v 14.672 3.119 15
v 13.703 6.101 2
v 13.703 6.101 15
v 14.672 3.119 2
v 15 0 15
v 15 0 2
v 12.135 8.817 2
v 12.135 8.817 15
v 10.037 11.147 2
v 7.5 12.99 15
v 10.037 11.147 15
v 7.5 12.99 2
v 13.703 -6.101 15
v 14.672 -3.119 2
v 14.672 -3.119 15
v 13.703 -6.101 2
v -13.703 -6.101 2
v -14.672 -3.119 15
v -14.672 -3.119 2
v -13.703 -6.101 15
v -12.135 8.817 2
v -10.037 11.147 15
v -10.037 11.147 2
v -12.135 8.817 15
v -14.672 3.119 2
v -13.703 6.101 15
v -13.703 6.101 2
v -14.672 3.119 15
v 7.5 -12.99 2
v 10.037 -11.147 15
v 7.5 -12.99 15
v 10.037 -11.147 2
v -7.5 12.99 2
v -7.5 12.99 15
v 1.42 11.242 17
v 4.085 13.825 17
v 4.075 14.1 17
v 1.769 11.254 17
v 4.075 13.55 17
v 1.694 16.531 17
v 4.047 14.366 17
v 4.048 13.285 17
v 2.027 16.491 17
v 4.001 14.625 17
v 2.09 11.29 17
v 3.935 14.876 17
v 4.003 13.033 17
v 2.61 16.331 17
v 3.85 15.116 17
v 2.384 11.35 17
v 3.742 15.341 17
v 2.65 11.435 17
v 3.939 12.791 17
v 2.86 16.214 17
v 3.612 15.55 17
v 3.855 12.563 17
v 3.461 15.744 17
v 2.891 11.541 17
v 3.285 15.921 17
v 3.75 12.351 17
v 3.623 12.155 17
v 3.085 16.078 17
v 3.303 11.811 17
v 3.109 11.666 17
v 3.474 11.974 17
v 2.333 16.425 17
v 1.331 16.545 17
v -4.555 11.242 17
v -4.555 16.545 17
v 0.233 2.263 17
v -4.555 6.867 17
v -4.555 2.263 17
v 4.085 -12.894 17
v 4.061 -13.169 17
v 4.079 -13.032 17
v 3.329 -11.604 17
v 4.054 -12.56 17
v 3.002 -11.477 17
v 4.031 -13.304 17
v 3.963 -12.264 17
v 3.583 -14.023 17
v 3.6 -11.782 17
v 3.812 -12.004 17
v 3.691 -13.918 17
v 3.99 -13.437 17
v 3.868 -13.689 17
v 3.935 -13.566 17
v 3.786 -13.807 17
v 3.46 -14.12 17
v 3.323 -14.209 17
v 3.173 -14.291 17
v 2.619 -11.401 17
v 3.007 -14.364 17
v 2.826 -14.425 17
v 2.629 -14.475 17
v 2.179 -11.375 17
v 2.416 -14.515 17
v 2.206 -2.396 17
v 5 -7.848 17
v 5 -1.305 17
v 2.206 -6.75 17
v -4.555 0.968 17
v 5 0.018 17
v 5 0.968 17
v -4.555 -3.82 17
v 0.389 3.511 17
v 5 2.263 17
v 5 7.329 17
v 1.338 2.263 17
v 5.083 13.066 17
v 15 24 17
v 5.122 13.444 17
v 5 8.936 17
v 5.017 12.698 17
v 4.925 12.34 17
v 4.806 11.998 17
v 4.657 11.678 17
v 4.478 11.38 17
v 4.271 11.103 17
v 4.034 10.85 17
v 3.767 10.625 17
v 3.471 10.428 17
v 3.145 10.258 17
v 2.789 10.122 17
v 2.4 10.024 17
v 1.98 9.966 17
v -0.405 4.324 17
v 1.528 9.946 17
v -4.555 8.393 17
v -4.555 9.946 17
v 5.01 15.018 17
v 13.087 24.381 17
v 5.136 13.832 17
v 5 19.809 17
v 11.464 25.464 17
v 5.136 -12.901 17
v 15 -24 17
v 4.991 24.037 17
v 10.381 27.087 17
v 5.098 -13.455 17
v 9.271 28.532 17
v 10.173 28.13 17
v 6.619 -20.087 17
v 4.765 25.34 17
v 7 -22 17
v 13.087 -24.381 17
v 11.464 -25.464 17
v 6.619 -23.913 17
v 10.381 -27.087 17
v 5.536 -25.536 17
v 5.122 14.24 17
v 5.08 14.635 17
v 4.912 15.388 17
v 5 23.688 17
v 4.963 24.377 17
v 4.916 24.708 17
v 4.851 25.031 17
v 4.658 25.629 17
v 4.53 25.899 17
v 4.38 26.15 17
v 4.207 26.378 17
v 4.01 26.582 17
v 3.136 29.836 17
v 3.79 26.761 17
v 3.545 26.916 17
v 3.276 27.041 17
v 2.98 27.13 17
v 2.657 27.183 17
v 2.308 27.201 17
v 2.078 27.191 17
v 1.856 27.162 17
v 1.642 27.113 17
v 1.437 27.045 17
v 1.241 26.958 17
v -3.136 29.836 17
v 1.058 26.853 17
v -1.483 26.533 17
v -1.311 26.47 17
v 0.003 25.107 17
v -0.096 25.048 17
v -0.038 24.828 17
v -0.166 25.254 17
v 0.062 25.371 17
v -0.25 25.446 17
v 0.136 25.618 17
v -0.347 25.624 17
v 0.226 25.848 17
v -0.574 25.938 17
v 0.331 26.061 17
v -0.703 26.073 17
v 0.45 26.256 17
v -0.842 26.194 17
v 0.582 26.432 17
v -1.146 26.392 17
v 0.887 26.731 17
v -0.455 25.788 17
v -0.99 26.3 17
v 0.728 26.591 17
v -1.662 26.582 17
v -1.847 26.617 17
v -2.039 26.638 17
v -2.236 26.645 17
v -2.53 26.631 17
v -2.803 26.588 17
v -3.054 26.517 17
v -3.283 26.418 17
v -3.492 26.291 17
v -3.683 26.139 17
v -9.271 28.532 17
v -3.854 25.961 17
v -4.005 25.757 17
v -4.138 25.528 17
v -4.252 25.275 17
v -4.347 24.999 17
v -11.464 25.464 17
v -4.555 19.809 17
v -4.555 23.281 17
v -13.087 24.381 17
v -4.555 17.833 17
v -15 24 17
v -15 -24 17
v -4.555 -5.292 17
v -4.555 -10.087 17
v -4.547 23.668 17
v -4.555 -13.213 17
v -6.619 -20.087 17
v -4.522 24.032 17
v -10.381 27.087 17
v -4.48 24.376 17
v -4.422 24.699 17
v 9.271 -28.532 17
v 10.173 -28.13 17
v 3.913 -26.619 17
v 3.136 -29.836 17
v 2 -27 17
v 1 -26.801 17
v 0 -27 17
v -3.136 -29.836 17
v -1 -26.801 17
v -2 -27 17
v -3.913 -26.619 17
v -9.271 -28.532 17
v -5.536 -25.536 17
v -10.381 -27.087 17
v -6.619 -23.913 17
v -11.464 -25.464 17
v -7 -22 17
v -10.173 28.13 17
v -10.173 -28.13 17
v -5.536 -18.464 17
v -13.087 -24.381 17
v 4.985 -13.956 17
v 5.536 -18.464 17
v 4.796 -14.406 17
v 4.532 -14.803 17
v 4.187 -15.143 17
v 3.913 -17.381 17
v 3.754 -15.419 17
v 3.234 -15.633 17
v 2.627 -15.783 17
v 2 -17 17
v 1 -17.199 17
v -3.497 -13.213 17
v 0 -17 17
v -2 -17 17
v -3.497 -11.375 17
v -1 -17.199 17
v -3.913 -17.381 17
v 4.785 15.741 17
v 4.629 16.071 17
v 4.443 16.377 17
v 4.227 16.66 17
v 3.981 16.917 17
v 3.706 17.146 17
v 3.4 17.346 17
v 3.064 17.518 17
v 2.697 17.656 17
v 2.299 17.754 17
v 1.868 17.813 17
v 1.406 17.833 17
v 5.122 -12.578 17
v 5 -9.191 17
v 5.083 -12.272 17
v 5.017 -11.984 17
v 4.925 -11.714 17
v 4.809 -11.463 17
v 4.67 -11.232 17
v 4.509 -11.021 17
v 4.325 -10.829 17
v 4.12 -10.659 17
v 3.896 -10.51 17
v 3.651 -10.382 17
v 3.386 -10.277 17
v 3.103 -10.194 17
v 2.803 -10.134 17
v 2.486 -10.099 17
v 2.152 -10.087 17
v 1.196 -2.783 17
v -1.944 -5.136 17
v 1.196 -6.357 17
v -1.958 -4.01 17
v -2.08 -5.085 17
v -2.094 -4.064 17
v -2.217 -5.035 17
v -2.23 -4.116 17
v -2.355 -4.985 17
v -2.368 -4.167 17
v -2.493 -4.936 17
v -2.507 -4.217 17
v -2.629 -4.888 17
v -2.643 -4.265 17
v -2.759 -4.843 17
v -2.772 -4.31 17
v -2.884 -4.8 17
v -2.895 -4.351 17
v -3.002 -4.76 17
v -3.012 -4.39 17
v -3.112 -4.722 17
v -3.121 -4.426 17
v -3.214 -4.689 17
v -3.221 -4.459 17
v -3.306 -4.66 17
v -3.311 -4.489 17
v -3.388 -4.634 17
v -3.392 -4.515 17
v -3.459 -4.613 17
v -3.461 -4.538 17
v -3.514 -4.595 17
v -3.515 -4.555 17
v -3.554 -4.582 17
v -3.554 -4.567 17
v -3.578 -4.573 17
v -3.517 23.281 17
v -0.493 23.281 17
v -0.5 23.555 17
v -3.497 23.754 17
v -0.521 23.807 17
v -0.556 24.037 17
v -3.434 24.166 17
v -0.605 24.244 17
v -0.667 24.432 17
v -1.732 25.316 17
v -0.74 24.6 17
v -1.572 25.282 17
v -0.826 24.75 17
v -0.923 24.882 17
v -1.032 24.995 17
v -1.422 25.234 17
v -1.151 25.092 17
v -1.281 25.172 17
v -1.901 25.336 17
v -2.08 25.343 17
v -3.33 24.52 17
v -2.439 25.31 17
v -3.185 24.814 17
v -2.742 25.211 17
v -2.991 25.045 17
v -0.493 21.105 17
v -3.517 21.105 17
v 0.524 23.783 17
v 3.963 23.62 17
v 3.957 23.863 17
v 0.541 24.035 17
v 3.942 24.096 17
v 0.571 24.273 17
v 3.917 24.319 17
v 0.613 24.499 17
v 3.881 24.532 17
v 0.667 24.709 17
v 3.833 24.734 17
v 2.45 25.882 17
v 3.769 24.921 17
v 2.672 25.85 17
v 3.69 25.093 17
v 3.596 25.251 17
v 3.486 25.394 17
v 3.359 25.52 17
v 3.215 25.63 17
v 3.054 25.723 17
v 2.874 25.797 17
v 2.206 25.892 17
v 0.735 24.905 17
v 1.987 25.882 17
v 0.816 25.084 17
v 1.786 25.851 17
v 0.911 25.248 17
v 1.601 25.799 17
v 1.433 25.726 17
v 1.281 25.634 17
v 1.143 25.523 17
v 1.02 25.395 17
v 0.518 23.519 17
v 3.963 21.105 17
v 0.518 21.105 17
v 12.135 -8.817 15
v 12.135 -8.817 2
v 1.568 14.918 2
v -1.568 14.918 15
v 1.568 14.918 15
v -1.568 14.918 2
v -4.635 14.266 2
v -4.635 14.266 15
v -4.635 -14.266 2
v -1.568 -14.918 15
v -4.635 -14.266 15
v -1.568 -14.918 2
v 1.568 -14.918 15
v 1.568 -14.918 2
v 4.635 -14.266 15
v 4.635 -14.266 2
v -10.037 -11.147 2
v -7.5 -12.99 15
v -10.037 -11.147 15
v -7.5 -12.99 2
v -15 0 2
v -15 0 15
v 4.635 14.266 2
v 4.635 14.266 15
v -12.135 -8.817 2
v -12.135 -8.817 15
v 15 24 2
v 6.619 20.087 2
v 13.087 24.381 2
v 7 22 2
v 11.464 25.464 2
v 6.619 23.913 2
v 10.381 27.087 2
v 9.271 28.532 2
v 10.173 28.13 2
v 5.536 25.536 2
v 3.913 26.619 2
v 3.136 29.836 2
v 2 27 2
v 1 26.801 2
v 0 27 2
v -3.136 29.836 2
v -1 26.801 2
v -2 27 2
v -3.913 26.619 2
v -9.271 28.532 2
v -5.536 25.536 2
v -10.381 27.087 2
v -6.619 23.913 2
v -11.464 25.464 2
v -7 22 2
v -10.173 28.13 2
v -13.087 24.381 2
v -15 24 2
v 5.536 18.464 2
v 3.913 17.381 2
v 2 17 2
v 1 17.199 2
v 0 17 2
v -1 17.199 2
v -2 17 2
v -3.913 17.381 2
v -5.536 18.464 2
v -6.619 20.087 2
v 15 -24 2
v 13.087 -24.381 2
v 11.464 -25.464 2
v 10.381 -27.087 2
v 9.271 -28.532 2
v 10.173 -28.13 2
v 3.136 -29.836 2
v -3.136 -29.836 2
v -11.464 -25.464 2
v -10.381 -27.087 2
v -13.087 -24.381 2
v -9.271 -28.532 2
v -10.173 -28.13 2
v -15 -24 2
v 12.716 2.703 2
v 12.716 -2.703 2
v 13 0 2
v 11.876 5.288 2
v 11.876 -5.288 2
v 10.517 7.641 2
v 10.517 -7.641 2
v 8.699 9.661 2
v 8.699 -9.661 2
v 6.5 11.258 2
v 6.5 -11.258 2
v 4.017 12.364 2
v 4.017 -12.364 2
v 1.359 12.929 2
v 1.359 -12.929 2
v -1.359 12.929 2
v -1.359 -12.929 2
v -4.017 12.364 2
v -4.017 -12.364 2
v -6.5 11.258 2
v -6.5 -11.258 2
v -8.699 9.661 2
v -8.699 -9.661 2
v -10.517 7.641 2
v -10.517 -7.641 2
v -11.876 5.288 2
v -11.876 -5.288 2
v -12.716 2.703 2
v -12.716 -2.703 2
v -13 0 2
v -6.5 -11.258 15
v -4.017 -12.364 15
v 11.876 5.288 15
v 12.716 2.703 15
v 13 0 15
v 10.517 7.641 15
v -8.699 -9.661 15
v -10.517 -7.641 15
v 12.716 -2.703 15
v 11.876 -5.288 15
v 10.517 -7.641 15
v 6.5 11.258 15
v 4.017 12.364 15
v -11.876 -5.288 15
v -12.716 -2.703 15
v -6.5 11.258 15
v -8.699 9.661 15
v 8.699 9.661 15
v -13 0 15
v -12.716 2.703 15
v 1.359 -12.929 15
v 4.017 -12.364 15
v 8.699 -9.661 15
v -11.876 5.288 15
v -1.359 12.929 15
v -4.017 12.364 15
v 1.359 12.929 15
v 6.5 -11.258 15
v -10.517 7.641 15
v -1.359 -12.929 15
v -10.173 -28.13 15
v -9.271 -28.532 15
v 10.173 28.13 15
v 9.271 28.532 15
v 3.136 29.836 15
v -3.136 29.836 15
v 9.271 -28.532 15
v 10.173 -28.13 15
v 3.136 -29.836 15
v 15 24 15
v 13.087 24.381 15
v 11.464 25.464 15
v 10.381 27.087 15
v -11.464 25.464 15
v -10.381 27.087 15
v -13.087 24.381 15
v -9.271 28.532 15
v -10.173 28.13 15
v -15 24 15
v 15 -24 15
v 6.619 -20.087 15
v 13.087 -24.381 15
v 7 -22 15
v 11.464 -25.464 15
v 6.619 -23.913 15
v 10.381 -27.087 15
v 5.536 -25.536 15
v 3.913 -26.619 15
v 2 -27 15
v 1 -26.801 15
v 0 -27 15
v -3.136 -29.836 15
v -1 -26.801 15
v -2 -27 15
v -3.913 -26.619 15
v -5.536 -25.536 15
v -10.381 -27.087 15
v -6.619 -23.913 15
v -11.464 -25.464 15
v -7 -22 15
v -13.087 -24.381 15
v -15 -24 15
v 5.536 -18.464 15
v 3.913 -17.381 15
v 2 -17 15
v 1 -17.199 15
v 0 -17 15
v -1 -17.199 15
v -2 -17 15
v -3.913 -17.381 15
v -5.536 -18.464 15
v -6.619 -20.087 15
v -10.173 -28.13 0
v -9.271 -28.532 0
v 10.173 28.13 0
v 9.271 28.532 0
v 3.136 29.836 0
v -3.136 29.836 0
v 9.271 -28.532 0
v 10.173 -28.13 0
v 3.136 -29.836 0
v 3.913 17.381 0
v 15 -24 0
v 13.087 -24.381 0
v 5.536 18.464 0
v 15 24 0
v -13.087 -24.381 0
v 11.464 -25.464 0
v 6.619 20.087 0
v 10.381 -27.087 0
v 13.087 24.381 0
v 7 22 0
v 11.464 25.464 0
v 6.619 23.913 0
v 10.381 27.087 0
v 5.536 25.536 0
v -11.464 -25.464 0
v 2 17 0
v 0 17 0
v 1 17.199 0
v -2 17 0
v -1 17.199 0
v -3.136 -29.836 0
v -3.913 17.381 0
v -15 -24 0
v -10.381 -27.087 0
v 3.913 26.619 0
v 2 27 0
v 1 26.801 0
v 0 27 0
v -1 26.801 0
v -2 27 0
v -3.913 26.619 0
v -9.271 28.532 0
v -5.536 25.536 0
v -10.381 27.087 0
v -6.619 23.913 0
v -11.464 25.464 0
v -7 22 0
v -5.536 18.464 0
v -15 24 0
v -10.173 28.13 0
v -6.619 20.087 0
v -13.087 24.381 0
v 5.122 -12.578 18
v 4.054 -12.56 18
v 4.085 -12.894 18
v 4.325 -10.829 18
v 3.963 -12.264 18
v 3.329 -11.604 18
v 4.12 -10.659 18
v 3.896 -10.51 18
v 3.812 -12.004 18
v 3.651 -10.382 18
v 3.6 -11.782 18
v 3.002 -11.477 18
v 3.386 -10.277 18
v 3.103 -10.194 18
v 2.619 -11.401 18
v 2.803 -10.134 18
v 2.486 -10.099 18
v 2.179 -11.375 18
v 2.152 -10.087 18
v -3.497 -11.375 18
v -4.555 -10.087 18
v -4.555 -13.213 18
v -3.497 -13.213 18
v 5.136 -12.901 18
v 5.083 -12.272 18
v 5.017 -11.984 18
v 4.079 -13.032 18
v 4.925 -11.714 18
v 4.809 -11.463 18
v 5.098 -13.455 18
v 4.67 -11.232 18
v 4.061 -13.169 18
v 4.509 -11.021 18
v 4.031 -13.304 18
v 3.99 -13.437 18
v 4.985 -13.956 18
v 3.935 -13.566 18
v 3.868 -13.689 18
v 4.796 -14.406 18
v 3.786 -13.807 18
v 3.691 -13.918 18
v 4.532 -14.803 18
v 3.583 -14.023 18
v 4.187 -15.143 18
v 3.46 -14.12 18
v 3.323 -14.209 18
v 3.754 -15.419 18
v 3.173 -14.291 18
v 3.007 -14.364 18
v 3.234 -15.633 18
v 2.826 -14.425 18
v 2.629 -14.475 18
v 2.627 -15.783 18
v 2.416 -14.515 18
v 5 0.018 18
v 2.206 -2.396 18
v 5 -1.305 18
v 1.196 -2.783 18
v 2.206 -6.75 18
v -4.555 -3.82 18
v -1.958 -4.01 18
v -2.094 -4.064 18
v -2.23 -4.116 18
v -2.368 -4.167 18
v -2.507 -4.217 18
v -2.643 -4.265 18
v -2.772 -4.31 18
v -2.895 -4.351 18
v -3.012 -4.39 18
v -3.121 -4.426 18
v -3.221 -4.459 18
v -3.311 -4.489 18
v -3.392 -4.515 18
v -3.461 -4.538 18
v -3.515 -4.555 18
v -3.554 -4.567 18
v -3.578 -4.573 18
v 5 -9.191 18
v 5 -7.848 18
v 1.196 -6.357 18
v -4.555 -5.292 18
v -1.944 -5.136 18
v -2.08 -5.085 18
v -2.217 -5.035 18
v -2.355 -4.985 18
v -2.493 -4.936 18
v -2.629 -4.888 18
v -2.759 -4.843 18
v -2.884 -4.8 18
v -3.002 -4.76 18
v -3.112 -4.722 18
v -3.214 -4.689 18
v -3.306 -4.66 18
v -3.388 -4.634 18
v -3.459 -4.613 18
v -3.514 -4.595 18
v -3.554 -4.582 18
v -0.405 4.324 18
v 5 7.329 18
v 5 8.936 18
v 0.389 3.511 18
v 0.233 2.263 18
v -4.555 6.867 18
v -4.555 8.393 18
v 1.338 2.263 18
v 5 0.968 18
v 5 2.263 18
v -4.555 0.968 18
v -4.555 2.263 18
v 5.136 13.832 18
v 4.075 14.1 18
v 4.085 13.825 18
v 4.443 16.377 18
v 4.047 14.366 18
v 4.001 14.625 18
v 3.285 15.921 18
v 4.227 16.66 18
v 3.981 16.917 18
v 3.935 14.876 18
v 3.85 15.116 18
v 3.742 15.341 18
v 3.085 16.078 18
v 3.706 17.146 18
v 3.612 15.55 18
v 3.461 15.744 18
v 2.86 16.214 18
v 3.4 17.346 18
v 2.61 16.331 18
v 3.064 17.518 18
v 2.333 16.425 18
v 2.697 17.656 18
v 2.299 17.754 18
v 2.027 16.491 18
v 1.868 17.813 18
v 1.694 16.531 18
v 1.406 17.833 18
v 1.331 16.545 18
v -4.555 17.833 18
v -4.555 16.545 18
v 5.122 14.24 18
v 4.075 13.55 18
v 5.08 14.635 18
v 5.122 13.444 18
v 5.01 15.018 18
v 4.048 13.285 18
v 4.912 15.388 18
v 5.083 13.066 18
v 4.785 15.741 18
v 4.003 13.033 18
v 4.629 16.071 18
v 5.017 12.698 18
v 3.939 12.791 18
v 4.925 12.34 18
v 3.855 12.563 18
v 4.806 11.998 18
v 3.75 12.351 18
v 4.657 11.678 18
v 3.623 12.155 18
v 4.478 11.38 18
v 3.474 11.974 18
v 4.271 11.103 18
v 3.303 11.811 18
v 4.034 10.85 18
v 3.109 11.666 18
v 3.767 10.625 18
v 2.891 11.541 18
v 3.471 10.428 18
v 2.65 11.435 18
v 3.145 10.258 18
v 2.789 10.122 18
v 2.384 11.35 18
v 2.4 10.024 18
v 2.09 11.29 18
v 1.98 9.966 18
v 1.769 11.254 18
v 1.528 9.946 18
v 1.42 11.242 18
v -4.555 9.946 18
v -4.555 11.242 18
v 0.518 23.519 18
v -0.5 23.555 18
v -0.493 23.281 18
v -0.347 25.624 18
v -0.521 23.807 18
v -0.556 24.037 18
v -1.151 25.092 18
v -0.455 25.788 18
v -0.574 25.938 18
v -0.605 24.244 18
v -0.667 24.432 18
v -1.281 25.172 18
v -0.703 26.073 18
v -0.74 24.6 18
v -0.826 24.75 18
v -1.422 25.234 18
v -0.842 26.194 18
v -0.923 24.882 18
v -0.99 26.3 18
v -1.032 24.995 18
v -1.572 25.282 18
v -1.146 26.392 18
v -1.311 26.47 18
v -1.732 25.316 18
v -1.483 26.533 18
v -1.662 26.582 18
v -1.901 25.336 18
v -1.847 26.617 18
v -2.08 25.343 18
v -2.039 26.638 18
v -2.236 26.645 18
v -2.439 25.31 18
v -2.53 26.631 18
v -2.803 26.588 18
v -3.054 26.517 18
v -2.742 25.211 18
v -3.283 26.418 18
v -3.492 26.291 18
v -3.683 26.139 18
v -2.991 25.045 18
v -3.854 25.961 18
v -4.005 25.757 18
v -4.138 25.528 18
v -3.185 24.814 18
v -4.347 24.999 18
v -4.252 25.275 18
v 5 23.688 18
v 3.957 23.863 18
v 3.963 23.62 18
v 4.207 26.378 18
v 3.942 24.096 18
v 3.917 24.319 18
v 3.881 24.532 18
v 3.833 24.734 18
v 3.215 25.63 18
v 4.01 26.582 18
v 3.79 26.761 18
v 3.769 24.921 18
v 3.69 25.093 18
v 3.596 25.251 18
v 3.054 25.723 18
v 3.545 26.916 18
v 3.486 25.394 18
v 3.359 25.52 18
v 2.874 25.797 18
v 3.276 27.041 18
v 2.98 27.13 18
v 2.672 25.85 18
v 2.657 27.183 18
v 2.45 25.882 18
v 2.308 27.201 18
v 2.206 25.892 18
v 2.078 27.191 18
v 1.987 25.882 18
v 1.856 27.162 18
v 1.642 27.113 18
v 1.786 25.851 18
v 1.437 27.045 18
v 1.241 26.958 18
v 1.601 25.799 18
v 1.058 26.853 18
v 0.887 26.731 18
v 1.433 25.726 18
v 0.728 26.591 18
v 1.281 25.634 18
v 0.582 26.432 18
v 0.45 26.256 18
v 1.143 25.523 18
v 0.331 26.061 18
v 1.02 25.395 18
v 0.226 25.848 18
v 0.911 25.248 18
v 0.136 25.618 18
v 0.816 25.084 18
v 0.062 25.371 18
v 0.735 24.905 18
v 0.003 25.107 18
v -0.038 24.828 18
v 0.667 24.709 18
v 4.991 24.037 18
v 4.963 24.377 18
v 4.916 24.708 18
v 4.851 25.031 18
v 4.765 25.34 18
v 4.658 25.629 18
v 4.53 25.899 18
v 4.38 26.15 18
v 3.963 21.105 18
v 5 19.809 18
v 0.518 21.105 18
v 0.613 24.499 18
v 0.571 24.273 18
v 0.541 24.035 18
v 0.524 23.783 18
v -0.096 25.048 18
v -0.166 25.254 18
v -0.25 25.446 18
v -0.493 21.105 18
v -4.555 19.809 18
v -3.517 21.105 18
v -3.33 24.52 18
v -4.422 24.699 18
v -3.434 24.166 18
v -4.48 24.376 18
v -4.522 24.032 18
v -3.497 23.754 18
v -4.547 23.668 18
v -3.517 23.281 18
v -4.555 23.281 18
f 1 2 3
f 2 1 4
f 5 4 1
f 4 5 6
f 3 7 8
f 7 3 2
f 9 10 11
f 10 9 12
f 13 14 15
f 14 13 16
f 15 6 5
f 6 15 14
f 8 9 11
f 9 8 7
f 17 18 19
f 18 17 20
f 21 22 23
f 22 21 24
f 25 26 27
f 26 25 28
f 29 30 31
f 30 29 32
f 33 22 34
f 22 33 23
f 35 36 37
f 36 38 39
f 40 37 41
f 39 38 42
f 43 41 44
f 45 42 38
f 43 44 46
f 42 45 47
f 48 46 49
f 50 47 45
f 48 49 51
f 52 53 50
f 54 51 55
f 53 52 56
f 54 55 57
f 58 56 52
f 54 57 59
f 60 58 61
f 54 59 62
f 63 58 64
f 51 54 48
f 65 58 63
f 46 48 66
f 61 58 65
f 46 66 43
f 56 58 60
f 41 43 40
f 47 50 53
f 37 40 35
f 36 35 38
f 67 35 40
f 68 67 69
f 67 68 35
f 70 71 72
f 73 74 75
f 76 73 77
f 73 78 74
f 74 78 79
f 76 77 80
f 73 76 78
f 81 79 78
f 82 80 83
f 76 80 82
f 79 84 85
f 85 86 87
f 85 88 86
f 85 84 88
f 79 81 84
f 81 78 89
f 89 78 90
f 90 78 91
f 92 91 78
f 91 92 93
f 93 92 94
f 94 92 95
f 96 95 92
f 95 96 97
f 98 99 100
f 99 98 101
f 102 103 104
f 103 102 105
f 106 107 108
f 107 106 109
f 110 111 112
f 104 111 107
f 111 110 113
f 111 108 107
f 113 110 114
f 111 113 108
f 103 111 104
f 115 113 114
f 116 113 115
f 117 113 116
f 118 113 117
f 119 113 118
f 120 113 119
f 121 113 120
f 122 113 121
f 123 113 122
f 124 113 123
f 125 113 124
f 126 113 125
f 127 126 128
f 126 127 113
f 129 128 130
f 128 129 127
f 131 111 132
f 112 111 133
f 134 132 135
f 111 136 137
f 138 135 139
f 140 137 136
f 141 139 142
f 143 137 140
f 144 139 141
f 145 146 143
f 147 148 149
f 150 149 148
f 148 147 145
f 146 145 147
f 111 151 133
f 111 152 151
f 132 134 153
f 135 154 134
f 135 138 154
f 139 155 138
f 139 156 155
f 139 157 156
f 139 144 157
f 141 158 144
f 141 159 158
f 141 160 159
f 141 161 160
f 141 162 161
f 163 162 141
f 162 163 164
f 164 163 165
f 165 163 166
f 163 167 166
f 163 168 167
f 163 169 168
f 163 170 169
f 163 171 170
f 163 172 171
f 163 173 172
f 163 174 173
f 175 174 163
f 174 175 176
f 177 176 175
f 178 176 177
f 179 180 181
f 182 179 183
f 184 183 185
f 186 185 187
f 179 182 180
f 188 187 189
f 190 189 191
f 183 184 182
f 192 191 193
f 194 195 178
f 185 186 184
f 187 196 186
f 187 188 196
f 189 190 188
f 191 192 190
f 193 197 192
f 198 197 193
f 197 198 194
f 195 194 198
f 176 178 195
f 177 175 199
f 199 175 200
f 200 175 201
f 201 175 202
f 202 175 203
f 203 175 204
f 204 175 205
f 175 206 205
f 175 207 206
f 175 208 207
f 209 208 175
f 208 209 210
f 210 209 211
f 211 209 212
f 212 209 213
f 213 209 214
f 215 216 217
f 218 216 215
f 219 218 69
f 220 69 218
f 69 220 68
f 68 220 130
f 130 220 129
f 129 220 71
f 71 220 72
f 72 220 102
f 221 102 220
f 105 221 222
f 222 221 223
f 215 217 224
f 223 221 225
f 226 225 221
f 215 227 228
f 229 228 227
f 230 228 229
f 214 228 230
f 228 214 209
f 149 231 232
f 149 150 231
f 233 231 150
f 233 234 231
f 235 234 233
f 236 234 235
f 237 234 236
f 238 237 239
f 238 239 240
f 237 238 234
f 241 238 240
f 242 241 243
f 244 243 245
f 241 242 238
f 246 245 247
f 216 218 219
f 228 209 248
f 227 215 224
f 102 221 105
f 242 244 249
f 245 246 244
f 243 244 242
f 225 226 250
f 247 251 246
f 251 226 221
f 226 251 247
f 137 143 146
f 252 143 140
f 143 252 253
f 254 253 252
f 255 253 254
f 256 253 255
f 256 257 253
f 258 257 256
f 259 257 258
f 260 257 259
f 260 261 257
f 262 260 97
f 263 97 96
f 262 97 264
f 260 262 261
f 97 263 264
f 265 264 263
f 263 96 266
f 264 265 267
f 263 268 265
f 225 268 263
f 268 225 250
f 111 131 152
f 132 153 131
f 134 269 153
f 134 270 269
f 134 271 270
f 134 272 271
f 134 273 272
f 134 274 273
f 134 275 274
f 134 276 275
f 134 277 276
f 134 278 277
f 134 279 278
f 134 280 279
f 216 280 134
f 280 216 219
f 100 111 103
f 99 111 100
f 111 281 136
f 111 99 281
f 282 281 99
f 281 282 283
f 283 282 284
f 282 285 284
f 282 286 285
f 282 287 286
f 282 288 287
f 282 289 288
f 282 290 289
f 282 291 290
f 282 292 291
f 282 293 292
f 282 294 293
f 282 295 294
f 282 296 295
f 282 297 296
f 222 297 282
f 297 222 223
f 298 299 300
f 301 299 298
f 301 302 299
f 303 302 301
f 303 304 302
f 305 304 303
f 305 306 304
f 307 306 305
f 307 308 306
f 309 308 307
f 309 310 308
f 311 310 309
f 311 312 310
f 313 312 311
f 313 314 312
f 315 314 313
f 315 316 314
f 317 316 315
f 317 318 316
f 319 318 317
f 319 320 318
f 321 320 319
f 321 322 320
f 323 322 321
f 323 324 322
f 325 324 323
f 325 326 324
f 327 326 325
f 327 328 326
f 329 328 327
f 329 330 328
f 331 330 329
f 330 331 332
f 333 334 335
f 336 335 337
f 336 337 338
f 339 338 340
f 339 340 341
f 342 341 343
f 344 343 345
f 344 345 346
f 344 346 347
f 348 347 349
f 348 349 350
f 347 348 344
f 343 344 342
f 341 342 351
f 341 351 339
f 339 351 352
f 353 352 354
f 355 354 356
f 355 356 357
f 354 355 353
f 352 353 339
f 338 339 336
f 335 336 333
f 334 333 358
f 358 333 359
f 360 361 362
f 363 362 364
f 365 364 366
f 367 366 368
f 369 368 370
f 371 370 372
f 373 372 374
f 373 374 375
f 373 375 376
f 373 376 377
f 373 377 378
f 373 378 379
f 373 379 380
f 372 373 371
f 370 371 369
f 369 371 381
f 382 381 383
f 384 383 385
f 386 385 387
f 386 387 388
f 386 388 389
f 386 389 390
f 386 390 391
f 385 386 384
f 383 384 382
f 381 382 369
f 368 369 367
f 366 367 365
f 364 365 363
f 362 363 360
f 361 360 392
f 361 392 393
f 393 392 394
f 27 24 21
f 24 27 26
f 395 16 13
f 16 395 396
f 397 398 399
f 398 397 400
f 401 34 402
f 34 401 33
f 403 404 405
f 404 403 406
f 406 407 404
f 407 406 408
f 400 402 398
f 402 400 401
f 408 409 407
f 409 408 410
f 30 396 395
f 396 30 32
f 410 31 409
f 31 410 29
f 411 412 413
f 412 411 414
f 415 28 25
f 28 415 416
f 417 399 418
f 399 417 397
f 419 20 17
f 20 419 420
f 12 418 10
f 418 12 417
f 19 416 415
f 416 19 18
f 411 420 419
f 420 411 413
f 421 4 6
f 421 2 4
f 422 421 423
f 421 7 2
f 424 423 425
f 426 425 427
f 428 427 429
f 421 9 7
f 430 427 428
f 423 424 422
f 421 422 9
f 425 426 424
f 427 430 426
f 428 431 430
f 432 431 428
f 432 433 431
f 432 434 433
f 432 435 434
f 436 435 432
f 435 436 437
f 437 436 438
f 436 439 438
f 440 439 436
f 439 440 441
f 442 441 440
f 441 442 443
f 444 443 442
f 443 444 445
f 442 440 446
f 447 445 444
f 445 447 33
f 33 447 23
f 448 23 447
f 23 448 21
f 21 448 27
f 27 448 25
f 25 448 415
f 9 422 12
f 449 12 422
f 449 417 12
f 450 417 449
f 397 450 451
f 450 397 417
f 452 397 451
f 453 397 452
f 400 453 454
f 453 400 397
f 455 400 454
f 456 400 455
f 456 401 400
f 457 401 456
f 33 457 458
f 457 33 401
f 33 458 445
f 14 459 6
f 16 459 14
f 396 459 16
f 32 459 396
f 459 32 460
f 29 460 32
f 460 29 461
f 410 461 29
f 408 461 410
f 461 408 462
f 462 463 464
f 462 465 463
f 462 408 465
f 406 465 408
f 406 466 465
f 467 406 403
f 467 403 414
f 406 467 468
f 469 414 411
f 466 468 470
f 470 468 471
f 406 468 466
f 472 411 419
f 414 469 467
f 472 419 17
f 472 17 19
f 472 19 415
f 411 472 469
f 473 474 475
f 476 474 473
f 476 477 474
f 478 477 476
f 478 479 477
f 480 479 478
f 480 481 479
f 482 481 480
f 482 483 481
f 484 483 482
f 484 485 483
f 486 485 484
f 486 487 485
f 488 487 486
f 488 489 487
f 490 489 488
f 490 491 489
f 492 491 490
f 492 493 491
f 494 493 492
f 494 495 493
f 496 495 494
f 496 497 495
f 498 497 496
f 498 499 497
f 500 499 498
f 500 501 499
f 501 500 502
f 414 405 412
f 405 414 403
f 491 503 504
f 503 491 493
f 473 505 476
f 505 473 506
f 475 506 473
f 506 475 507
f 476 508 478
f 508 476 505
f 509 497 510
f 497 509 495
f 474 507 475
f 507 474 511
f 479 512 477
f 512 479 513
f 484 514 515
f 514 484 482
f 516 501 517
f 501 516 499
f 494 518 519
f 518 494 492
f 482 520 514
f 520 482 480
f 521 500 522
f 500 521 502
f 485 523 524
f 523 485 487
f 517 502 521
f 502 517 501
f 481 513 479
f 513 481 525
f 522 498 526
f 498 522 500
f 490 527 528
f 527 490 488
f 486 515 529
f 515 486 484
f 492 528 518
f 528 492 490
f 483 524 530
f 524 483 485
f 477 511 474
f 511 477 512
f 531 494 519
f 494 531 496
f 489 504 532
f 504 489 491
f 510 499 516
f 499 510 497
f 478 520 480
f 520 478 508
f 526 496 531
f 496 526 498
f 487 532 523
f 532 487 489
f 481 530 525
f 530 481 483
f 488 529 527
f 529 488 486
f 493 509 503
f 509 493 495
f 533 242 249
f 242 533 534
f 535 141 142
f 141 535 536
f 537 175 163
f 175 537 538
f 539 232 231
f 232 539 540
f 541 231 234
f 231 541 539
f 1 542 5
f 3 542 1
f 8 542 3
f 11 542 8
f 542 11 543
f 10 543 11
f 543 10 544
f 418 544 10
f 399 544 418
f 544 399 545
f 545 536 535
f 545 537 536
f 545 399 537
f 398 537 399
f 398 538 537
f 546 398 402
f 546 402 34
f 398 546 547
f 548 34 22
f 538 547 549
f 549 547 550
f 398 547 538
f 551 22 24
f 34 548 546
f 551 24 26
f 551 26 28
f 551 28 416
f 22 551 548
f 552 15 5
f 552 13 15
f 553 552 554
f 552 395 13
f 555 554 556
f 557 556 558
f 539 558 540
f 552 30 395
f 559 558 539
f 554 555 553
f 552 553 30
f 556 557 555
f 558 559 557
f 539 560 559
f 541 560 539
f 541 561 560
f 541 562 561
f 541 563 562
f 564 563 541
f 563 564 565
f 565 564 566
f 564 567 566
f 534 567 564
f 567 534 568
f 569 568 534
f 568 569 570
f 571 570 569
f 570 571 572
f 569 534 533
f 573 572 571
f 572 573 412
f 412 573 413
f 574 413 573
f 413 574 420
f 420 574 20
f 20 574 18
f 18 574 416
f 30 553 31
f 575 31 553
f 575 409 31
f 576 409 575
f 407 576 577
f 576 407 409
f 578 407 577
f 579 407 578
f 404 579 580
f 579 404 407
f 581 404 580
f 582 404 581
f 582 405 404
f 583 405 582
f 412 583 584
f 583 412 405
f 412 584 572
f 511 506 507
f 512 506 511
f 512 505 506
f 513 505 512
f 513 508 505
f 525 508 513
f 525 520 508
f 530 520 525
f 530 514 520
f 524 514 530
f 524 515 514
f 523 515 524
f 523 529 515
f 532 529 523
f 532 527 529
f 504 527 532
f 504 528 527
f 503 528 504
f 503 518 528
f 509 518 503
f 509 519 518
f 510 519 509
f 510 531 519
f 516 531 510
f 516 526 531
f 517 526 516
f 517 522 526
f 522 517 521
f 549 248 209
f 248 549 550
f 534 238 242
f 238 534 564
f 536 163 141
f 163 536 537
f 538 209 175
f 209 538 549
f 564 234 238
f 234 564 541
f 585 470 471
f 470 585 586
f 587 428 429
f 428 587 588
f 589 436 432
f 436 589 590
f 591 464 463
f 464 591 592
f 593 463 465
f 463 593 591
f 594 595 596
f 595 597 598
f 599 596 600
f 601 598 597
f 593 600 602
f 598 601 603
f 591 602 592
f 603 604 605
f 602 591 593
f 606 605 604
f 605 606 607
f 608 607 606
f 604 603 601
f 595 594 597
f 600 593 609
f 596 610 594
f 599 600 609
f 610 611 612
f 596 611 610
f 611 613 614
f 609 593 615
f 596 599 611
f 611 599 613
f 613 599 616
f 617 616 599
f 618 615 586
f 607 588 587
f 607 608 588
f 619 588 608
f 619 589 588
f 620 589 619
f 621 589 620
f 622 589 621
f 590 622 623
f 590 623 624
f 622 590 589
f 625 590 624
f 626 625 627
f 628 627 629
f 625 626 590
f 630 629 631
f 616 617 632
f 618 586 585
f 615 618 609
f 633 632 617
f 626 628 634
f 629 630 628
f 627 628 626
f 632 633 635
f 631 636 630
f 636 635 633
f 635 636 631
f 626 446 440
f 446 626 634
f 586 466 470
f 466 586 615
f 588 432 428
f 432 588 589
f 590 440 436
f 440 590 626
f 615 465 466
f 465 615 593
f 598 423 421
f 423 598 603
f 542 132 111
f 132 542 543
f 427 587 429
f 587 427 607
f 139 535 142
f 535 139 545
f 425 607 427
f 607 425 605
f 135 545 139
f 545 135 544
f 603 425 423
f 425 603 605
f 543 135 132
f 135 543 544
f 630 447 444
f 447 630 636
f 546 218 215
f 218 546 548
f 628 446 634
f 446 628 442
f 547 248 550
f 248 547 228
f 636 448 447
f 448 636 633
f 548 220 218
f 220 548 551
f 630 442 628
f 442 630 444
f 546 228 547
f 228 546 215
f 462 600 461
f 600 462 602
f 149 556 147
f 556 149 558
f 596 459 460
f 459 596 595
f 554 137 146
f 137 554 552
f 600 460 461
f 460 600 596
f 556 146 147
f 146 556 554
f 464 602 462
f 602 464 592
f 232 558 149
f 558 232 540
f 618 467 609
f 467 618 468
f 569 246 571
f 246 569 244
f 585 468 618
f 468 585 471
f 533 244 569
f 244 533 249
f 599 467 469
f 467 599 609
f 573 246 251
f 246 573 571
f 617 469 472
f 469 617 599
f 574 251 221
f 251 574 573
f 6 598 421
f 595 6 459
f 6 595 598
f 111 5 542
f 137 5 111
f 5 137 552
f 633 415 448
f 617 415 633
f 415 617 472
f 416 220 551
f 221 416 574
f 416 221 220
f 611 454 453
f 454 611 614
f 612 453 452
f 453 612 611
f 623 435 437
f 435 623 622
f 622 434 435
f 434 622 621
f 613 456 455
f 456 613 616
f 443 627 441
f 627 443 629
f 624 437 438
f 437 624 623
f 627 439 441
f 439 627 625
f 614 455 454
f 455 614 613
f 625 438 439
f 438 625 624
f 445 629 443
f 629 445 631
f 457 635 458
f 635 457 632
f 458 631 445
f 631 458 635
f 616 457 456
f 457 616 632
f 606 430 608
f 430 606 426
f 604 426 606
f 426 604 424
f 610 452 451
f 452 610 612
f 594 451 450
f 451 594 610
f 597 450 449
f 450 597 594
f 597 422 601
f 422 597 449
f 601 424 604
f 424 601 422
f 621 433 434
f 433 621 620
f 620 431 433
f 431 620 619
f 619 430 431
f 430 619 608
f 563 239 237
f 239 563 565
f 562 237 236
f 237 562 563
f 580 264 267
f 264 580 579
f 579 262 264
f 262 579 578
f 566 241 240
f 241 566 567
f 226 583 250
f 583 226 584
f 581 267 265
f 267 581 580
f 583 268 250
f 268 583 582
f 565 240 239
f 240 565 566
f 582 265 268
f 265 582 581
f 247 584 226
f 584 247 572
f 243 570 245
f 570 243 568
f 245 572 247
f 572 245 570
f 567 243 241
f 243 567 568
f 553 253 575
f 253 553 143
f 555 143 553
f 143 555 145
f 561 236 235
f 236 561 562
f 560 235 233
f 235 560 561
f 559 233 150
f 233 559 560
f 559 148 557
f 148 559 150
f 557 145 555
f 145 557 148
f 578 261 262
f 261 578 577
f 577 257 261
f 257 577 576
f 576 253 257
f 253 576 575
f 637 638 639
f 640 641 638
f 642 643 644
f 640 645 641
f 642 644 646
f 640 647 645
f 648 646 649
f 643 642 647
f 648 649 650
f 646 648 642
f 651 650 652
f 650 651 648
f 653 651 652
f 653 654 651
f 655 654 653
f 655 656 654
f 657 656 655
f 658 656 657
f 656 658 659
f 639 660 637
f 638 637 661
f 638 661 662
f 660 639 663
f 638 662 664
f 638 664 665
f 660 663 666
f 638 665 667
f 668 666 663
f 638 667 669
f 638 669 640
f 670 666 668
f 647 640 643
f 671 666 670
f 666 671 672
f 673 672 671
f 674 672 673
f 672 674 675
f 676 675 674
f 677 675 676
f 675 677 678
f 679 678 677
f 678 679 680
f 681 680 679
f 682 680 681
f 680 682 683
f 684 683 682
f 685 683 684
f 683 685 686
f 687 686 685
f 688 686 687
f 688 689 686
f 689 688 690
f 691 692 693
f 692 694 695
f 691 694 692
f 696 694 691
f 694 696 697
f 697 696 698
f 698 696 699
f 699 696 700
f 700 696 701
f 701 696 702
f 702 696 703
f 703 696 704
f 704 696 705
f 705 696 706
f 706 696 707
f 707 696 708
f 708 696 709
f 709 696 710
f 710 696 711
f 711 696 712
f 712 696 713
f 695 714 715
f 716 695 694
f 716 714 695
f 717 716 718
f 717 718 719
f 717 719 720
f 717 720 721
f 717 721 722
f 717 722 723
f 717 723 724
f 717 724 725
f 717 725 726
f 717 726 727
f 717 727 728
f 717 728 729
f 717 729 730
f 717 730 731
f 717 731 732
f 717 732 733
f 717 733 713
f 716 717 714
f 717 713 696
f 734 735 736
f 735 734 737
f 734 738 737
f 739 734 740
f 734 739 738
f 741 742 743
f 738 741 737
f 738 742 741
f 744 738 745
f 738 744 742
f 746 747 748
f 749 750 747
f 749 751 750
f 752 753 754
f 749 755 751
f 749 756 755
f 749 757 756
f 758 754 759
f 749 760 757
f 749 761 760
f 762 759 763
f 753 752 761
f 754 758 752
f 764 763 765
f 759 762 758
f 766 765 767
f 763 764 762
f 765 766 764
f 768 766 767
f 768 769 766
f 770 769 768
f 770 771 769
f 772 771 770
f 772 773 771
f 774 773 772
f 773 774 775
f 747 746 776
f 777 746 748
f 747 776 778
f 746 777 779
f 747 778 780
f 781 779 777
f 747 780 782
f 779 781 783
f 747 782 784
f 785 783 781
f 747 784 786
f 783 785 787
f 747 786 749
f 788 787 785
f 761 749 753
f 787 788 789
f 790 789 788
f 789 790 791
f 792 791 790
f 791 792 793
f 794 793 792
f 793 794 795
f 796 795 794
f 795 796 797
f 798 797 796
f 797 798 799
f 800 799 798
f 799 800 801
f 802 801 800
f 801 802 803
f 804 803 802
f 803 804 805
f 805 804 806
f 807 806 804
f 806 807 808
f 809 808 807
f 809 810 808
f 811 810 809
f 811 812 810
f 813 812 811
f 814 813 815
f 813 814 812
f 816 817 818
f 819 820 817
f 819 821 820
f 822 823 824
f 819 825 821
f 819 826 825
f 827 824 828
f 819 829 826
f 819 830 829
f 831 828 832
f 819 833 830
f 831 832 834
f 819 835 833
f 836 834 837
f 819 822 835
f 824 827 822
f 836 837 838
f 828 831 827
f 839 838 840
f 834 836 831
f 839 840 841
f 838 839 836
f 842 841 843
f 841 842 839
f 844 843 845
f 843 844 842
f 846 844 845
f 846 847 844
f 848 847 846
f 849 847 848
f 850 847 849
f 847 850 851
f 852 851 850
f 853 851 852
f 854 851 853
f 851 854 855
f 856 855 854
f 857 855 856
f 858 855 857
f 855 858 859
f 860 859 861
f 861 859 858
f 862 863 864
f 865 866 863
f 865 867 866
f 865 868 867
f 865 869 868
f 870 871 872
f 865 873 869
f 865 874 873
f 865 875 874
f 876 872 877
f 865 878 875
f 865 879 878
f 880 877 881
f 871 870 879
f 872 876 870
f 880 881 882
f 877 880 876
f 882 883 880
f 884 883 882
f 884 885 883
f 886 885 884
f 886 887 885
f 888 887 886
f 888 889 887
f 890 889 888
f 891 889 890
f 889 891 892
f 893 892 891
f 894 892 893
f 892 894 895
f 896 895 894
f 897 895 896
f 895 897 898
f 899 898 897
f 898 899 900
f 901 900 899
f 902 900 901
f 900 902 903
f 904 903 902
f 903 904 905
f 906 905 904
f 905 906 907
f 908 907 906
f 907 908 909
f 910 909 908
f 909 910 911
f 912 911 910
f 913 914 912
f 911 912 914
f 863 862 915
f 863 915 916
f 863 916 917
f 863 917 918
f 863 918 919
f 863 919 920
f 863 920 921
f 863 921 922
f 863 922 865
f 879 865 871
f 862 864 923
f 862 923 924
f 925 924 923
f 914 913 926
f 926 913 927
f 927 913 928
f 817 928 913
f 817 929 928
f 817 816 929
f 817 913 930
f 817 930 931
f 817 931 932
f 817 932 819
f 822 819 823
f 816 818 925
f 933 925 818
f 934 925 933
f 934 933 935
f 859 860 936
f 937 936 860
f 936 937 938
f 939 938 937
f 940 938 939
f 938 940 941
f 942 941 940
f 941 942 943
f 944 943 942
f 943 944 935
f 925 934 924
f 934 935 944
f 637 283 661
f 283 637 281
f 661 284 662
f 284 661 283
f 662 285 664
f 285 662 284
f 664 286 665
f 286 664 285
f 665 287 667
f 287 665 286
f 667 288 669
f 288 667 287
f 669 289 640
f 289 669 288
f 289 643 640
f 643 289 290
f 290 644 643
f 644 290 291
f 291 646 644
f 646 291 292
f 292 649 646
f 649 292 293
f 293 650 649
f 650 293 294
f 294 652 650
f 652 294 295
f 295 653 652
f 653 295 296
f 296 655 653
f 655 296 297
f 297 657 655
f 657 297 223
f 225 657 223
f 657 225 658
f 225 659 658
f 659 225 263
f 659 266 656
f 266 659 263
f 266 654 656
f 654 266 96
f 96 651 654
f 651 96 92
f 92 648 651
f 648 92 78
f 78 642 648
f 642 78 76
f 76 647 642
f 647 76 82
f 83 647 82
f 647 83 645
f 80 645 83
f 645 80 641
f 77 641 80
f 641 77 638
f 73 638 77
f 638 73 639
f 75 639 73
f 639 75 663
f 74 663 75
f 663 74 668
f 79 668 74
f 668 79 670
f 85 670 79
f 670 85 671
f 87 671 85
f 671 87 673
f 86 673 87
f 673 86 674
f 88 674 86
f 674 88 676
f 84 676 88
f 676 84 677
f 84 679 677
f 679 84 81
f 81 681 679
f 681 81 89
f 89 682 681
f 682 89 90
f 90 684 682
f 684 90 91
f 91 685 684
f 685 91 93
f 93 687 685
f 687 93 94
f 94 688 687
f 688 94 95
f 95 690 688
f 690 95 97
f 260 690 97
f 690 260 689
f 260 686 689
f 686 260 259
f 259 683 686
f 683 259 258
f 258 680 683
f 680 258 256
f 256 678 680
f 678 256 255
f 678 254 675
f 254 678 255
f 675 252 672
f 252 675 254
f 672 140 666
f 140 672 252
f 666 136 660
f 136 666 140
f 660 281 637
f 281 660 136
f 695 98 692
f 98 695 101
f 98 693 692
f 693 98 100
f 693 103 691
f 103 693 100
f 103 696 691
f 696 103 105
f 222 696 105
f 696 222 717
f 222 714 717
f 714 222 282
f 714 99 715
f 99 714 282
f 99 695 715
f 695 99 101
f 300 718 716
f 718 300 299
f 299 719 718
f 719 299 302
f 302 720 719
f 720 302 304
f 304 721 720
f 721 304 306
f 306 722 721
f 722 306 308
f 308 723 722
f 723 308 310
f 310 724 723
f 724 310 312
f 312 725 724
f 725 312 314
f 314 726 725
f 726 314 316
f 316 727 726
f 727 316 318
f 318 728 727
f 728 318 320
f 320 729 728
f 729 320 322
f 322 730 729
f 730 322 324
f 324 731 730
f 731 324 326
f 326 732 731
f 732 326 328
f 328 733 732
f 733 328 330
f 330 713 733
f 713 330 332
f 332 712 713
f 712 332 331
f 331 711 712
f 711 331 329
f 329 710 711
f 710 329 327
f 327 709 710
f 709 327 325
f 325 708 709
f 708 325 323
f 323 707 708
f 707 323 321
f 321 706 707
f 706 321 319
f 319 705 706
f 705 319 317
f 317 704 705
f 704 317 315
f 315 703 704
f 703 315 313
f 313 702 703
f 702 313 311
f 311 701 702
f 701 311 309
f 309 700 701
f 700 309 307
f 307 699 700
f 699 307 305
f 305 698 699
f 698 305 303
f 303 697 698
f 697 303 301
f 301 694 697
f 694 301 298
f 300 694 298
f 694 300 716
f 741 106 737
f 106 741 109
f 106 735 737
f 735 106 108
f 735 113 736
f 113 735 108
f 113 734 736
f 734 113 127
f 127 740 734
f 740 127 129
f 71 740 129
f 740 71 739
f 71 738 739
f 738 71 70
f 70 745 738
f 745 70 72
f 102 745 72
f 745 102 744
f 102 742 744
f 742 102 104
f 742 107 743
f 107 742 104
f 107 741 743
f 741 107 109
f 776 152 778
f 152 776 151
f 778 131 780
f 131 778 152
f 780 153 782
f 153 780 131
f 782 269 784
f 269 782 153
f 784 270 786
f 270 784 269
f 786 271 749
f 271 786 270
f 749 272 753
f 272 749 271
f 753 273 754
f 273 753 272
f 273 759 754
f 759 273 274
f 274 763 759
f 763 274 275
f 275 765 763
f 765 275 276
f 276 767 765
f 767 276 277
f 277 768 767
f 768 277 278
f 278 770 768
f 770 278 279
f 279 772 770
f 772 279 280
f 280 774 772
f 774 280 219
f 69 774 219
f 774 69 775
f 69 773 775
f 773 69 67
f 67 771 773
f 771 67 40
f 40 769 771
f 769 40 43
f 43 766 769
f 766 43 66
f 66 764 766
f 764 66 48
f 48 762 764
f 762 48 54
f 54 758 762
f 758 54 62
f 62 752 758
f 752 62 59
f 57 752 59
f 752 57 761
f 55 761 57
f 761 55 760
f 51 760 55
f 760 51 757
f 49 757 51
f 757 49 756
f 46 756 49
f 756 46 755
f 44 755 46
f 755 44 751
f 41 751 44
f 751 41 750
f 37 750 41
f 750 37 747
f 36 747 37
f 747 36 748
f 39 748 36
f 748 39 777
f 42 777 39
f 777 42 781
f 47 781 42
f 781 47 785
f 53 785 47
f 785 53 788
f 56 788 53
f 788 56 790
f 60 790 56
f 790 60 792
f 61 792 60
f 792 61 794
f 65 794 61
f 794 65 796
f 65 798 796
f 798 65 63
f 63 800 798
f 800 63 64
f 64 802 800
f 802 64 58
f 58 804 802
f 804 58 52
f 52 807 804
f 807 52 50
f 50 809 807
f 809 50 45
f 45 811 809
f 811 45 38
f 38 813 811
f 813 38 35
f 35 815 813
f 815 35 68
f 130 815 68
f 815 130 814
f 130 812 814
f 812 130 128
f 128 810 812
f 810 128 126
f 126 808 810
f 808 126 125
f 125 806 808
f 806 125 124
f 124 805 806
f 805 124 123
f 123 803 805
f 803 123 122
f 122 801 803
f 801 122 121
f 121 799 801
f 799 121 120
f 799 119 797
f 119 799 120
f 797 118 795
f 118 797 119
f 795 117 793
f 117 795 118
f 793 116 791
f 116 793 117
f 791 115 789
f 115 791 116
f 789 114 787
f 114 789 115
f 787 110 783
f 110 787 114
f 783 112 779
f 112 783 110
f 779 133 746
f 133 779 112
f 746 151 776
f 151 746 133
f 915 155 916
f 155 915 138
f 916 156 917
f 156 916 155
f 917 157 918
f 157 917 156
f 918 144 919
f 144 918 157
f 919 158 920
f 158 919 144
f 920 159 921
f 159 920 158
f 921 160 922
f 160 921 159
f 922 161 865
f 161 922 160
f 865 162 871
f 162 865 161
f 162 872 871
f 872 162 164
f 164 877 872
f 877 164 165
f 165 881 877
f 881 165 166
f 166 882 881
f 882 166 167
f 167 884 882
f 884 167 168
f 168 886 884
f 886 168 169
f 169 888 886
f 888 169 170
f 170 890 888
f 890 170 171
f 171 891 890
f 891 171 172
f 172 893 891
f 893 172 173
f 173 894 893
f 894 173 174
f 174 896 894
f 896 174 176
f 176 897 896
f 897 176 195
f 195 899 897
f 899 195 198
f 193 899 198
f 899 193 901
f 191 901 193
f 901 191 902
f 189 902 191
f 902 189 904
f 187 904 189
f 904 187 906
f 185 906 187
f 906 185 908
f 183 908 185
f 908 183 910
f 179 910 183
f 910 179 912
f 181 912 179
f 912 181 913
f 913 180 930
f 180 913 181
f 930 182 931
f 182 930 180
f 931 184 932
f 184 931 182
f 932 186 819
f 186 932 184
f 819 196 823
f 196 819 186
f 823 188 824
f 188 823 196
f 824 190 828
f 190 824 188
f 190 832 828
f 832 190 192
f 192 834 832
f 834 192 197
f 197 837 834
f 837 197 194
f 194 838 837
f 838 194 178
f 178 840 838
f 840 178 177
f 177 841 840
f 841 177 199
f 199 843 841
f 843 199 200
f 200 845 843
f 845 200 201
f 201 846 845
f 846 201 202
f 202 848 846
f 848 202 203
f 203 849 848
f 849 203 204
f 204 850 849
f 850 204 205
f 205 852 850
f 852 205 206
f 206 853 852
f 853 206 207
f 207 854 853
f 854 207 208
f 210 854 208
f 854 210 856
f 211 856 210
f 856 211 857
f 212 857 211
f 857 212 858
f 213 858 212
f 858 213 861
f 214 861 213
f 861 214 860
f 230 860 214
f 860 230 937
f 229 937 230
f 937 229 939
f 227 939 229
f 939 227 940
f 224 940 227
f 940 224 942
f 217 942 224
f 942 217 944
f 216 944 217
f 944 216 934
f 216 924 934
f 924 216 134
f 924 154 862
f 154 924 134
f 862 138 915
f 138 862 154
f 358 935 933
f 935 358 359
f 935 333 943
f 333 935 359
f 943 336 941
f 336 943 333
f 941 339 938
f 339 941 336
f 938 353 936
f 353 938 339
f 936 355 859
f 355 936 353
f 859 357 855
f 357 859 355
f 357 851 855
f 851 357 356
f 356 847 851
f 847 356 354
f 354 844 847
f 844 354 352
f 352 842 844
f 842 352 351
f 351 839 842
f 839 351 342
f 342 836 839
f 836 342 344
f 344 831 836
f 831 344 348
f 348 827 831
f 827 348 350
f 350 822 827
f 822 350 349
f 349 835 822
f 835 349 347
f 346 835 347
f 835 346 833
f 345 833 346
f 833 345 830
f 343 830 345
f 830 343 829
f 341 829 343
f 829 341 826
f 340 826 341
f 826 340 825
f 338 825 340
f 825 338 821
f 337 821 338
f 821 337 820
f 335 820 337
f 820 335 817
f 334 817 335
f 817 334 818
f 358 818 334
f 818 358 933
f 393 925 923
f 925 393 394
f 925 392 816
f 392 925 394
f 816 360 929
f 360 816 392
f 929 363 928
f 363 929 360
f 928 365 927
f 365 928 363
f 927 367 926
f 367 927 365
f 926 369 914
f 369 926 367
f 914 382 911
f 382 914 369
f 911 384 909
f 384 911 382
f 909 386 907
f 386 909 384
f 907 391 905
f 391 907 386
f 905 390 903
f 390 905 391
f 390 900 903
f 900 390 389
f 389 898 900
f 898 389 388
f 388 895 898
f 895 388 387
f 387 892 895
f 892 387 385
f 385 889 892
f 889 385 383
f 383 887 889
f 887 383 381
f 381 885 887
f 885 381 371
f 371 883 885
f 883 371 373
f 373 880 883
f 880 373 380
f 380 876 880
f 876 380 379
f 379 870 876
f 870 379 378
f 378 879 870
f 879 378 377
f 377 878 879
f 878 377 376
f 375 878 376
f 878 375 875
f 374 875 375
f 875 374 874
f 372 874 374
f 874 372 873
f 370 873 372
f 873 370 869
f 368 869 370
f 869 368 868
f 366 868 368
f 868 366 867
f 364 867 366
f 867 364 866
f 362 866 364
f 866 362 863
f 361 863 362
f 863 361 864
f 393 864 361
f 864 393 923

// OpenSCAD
difference() {

  union() {
    center();
    top();
    top_bottom();
    }
    choppers();
    holes();
  }

module top_bottom() {
  cylinder(h=2, r=30);
  }

translate([5,-16,16]) {
  rotate(90) {
    linear_extrude(2) {
      text("JAKUB");  
        }
    }
  }

module top() {
  translate([0,0,15])
      top_bottom();
  } 

module center() {
  translate([0,0,2])
    difference() {
      cylinder(h=15, r=15);
      cylinder(h=15, r=13);
    }
  }

module chopper() {
  cube([15,60,21],false);
  }

module choppers() {
  translate([15,-30,-1])
    chopper();
  translate([-30,-30,-1])
    chopper();
  corner_holes();
  }

module corner_holes() {
  translate([15,29,-1])
    cylinder(h=21, r=5);
  translate([-15,29,-1])
    cylinder(h=21, r=5);
  translate([15,-29,-1])
    cylinder(h=21, r=5);
  translate([-15,-29,-1])
    cylinder(h=21, r=5);
}

module hole() {
  translate([0,0,-1])
    hole_bit();
  translate([-2,0,-1])
    hole_bit();
  translate([2,0,-1])
    hole_bit();
  }

module holes() {
  translate([0,22,0])
    hole();
  translate([0,-22,15])
    hole();
  }

module hole_bit() {
  cylinder(h=5,r=5);
  }
